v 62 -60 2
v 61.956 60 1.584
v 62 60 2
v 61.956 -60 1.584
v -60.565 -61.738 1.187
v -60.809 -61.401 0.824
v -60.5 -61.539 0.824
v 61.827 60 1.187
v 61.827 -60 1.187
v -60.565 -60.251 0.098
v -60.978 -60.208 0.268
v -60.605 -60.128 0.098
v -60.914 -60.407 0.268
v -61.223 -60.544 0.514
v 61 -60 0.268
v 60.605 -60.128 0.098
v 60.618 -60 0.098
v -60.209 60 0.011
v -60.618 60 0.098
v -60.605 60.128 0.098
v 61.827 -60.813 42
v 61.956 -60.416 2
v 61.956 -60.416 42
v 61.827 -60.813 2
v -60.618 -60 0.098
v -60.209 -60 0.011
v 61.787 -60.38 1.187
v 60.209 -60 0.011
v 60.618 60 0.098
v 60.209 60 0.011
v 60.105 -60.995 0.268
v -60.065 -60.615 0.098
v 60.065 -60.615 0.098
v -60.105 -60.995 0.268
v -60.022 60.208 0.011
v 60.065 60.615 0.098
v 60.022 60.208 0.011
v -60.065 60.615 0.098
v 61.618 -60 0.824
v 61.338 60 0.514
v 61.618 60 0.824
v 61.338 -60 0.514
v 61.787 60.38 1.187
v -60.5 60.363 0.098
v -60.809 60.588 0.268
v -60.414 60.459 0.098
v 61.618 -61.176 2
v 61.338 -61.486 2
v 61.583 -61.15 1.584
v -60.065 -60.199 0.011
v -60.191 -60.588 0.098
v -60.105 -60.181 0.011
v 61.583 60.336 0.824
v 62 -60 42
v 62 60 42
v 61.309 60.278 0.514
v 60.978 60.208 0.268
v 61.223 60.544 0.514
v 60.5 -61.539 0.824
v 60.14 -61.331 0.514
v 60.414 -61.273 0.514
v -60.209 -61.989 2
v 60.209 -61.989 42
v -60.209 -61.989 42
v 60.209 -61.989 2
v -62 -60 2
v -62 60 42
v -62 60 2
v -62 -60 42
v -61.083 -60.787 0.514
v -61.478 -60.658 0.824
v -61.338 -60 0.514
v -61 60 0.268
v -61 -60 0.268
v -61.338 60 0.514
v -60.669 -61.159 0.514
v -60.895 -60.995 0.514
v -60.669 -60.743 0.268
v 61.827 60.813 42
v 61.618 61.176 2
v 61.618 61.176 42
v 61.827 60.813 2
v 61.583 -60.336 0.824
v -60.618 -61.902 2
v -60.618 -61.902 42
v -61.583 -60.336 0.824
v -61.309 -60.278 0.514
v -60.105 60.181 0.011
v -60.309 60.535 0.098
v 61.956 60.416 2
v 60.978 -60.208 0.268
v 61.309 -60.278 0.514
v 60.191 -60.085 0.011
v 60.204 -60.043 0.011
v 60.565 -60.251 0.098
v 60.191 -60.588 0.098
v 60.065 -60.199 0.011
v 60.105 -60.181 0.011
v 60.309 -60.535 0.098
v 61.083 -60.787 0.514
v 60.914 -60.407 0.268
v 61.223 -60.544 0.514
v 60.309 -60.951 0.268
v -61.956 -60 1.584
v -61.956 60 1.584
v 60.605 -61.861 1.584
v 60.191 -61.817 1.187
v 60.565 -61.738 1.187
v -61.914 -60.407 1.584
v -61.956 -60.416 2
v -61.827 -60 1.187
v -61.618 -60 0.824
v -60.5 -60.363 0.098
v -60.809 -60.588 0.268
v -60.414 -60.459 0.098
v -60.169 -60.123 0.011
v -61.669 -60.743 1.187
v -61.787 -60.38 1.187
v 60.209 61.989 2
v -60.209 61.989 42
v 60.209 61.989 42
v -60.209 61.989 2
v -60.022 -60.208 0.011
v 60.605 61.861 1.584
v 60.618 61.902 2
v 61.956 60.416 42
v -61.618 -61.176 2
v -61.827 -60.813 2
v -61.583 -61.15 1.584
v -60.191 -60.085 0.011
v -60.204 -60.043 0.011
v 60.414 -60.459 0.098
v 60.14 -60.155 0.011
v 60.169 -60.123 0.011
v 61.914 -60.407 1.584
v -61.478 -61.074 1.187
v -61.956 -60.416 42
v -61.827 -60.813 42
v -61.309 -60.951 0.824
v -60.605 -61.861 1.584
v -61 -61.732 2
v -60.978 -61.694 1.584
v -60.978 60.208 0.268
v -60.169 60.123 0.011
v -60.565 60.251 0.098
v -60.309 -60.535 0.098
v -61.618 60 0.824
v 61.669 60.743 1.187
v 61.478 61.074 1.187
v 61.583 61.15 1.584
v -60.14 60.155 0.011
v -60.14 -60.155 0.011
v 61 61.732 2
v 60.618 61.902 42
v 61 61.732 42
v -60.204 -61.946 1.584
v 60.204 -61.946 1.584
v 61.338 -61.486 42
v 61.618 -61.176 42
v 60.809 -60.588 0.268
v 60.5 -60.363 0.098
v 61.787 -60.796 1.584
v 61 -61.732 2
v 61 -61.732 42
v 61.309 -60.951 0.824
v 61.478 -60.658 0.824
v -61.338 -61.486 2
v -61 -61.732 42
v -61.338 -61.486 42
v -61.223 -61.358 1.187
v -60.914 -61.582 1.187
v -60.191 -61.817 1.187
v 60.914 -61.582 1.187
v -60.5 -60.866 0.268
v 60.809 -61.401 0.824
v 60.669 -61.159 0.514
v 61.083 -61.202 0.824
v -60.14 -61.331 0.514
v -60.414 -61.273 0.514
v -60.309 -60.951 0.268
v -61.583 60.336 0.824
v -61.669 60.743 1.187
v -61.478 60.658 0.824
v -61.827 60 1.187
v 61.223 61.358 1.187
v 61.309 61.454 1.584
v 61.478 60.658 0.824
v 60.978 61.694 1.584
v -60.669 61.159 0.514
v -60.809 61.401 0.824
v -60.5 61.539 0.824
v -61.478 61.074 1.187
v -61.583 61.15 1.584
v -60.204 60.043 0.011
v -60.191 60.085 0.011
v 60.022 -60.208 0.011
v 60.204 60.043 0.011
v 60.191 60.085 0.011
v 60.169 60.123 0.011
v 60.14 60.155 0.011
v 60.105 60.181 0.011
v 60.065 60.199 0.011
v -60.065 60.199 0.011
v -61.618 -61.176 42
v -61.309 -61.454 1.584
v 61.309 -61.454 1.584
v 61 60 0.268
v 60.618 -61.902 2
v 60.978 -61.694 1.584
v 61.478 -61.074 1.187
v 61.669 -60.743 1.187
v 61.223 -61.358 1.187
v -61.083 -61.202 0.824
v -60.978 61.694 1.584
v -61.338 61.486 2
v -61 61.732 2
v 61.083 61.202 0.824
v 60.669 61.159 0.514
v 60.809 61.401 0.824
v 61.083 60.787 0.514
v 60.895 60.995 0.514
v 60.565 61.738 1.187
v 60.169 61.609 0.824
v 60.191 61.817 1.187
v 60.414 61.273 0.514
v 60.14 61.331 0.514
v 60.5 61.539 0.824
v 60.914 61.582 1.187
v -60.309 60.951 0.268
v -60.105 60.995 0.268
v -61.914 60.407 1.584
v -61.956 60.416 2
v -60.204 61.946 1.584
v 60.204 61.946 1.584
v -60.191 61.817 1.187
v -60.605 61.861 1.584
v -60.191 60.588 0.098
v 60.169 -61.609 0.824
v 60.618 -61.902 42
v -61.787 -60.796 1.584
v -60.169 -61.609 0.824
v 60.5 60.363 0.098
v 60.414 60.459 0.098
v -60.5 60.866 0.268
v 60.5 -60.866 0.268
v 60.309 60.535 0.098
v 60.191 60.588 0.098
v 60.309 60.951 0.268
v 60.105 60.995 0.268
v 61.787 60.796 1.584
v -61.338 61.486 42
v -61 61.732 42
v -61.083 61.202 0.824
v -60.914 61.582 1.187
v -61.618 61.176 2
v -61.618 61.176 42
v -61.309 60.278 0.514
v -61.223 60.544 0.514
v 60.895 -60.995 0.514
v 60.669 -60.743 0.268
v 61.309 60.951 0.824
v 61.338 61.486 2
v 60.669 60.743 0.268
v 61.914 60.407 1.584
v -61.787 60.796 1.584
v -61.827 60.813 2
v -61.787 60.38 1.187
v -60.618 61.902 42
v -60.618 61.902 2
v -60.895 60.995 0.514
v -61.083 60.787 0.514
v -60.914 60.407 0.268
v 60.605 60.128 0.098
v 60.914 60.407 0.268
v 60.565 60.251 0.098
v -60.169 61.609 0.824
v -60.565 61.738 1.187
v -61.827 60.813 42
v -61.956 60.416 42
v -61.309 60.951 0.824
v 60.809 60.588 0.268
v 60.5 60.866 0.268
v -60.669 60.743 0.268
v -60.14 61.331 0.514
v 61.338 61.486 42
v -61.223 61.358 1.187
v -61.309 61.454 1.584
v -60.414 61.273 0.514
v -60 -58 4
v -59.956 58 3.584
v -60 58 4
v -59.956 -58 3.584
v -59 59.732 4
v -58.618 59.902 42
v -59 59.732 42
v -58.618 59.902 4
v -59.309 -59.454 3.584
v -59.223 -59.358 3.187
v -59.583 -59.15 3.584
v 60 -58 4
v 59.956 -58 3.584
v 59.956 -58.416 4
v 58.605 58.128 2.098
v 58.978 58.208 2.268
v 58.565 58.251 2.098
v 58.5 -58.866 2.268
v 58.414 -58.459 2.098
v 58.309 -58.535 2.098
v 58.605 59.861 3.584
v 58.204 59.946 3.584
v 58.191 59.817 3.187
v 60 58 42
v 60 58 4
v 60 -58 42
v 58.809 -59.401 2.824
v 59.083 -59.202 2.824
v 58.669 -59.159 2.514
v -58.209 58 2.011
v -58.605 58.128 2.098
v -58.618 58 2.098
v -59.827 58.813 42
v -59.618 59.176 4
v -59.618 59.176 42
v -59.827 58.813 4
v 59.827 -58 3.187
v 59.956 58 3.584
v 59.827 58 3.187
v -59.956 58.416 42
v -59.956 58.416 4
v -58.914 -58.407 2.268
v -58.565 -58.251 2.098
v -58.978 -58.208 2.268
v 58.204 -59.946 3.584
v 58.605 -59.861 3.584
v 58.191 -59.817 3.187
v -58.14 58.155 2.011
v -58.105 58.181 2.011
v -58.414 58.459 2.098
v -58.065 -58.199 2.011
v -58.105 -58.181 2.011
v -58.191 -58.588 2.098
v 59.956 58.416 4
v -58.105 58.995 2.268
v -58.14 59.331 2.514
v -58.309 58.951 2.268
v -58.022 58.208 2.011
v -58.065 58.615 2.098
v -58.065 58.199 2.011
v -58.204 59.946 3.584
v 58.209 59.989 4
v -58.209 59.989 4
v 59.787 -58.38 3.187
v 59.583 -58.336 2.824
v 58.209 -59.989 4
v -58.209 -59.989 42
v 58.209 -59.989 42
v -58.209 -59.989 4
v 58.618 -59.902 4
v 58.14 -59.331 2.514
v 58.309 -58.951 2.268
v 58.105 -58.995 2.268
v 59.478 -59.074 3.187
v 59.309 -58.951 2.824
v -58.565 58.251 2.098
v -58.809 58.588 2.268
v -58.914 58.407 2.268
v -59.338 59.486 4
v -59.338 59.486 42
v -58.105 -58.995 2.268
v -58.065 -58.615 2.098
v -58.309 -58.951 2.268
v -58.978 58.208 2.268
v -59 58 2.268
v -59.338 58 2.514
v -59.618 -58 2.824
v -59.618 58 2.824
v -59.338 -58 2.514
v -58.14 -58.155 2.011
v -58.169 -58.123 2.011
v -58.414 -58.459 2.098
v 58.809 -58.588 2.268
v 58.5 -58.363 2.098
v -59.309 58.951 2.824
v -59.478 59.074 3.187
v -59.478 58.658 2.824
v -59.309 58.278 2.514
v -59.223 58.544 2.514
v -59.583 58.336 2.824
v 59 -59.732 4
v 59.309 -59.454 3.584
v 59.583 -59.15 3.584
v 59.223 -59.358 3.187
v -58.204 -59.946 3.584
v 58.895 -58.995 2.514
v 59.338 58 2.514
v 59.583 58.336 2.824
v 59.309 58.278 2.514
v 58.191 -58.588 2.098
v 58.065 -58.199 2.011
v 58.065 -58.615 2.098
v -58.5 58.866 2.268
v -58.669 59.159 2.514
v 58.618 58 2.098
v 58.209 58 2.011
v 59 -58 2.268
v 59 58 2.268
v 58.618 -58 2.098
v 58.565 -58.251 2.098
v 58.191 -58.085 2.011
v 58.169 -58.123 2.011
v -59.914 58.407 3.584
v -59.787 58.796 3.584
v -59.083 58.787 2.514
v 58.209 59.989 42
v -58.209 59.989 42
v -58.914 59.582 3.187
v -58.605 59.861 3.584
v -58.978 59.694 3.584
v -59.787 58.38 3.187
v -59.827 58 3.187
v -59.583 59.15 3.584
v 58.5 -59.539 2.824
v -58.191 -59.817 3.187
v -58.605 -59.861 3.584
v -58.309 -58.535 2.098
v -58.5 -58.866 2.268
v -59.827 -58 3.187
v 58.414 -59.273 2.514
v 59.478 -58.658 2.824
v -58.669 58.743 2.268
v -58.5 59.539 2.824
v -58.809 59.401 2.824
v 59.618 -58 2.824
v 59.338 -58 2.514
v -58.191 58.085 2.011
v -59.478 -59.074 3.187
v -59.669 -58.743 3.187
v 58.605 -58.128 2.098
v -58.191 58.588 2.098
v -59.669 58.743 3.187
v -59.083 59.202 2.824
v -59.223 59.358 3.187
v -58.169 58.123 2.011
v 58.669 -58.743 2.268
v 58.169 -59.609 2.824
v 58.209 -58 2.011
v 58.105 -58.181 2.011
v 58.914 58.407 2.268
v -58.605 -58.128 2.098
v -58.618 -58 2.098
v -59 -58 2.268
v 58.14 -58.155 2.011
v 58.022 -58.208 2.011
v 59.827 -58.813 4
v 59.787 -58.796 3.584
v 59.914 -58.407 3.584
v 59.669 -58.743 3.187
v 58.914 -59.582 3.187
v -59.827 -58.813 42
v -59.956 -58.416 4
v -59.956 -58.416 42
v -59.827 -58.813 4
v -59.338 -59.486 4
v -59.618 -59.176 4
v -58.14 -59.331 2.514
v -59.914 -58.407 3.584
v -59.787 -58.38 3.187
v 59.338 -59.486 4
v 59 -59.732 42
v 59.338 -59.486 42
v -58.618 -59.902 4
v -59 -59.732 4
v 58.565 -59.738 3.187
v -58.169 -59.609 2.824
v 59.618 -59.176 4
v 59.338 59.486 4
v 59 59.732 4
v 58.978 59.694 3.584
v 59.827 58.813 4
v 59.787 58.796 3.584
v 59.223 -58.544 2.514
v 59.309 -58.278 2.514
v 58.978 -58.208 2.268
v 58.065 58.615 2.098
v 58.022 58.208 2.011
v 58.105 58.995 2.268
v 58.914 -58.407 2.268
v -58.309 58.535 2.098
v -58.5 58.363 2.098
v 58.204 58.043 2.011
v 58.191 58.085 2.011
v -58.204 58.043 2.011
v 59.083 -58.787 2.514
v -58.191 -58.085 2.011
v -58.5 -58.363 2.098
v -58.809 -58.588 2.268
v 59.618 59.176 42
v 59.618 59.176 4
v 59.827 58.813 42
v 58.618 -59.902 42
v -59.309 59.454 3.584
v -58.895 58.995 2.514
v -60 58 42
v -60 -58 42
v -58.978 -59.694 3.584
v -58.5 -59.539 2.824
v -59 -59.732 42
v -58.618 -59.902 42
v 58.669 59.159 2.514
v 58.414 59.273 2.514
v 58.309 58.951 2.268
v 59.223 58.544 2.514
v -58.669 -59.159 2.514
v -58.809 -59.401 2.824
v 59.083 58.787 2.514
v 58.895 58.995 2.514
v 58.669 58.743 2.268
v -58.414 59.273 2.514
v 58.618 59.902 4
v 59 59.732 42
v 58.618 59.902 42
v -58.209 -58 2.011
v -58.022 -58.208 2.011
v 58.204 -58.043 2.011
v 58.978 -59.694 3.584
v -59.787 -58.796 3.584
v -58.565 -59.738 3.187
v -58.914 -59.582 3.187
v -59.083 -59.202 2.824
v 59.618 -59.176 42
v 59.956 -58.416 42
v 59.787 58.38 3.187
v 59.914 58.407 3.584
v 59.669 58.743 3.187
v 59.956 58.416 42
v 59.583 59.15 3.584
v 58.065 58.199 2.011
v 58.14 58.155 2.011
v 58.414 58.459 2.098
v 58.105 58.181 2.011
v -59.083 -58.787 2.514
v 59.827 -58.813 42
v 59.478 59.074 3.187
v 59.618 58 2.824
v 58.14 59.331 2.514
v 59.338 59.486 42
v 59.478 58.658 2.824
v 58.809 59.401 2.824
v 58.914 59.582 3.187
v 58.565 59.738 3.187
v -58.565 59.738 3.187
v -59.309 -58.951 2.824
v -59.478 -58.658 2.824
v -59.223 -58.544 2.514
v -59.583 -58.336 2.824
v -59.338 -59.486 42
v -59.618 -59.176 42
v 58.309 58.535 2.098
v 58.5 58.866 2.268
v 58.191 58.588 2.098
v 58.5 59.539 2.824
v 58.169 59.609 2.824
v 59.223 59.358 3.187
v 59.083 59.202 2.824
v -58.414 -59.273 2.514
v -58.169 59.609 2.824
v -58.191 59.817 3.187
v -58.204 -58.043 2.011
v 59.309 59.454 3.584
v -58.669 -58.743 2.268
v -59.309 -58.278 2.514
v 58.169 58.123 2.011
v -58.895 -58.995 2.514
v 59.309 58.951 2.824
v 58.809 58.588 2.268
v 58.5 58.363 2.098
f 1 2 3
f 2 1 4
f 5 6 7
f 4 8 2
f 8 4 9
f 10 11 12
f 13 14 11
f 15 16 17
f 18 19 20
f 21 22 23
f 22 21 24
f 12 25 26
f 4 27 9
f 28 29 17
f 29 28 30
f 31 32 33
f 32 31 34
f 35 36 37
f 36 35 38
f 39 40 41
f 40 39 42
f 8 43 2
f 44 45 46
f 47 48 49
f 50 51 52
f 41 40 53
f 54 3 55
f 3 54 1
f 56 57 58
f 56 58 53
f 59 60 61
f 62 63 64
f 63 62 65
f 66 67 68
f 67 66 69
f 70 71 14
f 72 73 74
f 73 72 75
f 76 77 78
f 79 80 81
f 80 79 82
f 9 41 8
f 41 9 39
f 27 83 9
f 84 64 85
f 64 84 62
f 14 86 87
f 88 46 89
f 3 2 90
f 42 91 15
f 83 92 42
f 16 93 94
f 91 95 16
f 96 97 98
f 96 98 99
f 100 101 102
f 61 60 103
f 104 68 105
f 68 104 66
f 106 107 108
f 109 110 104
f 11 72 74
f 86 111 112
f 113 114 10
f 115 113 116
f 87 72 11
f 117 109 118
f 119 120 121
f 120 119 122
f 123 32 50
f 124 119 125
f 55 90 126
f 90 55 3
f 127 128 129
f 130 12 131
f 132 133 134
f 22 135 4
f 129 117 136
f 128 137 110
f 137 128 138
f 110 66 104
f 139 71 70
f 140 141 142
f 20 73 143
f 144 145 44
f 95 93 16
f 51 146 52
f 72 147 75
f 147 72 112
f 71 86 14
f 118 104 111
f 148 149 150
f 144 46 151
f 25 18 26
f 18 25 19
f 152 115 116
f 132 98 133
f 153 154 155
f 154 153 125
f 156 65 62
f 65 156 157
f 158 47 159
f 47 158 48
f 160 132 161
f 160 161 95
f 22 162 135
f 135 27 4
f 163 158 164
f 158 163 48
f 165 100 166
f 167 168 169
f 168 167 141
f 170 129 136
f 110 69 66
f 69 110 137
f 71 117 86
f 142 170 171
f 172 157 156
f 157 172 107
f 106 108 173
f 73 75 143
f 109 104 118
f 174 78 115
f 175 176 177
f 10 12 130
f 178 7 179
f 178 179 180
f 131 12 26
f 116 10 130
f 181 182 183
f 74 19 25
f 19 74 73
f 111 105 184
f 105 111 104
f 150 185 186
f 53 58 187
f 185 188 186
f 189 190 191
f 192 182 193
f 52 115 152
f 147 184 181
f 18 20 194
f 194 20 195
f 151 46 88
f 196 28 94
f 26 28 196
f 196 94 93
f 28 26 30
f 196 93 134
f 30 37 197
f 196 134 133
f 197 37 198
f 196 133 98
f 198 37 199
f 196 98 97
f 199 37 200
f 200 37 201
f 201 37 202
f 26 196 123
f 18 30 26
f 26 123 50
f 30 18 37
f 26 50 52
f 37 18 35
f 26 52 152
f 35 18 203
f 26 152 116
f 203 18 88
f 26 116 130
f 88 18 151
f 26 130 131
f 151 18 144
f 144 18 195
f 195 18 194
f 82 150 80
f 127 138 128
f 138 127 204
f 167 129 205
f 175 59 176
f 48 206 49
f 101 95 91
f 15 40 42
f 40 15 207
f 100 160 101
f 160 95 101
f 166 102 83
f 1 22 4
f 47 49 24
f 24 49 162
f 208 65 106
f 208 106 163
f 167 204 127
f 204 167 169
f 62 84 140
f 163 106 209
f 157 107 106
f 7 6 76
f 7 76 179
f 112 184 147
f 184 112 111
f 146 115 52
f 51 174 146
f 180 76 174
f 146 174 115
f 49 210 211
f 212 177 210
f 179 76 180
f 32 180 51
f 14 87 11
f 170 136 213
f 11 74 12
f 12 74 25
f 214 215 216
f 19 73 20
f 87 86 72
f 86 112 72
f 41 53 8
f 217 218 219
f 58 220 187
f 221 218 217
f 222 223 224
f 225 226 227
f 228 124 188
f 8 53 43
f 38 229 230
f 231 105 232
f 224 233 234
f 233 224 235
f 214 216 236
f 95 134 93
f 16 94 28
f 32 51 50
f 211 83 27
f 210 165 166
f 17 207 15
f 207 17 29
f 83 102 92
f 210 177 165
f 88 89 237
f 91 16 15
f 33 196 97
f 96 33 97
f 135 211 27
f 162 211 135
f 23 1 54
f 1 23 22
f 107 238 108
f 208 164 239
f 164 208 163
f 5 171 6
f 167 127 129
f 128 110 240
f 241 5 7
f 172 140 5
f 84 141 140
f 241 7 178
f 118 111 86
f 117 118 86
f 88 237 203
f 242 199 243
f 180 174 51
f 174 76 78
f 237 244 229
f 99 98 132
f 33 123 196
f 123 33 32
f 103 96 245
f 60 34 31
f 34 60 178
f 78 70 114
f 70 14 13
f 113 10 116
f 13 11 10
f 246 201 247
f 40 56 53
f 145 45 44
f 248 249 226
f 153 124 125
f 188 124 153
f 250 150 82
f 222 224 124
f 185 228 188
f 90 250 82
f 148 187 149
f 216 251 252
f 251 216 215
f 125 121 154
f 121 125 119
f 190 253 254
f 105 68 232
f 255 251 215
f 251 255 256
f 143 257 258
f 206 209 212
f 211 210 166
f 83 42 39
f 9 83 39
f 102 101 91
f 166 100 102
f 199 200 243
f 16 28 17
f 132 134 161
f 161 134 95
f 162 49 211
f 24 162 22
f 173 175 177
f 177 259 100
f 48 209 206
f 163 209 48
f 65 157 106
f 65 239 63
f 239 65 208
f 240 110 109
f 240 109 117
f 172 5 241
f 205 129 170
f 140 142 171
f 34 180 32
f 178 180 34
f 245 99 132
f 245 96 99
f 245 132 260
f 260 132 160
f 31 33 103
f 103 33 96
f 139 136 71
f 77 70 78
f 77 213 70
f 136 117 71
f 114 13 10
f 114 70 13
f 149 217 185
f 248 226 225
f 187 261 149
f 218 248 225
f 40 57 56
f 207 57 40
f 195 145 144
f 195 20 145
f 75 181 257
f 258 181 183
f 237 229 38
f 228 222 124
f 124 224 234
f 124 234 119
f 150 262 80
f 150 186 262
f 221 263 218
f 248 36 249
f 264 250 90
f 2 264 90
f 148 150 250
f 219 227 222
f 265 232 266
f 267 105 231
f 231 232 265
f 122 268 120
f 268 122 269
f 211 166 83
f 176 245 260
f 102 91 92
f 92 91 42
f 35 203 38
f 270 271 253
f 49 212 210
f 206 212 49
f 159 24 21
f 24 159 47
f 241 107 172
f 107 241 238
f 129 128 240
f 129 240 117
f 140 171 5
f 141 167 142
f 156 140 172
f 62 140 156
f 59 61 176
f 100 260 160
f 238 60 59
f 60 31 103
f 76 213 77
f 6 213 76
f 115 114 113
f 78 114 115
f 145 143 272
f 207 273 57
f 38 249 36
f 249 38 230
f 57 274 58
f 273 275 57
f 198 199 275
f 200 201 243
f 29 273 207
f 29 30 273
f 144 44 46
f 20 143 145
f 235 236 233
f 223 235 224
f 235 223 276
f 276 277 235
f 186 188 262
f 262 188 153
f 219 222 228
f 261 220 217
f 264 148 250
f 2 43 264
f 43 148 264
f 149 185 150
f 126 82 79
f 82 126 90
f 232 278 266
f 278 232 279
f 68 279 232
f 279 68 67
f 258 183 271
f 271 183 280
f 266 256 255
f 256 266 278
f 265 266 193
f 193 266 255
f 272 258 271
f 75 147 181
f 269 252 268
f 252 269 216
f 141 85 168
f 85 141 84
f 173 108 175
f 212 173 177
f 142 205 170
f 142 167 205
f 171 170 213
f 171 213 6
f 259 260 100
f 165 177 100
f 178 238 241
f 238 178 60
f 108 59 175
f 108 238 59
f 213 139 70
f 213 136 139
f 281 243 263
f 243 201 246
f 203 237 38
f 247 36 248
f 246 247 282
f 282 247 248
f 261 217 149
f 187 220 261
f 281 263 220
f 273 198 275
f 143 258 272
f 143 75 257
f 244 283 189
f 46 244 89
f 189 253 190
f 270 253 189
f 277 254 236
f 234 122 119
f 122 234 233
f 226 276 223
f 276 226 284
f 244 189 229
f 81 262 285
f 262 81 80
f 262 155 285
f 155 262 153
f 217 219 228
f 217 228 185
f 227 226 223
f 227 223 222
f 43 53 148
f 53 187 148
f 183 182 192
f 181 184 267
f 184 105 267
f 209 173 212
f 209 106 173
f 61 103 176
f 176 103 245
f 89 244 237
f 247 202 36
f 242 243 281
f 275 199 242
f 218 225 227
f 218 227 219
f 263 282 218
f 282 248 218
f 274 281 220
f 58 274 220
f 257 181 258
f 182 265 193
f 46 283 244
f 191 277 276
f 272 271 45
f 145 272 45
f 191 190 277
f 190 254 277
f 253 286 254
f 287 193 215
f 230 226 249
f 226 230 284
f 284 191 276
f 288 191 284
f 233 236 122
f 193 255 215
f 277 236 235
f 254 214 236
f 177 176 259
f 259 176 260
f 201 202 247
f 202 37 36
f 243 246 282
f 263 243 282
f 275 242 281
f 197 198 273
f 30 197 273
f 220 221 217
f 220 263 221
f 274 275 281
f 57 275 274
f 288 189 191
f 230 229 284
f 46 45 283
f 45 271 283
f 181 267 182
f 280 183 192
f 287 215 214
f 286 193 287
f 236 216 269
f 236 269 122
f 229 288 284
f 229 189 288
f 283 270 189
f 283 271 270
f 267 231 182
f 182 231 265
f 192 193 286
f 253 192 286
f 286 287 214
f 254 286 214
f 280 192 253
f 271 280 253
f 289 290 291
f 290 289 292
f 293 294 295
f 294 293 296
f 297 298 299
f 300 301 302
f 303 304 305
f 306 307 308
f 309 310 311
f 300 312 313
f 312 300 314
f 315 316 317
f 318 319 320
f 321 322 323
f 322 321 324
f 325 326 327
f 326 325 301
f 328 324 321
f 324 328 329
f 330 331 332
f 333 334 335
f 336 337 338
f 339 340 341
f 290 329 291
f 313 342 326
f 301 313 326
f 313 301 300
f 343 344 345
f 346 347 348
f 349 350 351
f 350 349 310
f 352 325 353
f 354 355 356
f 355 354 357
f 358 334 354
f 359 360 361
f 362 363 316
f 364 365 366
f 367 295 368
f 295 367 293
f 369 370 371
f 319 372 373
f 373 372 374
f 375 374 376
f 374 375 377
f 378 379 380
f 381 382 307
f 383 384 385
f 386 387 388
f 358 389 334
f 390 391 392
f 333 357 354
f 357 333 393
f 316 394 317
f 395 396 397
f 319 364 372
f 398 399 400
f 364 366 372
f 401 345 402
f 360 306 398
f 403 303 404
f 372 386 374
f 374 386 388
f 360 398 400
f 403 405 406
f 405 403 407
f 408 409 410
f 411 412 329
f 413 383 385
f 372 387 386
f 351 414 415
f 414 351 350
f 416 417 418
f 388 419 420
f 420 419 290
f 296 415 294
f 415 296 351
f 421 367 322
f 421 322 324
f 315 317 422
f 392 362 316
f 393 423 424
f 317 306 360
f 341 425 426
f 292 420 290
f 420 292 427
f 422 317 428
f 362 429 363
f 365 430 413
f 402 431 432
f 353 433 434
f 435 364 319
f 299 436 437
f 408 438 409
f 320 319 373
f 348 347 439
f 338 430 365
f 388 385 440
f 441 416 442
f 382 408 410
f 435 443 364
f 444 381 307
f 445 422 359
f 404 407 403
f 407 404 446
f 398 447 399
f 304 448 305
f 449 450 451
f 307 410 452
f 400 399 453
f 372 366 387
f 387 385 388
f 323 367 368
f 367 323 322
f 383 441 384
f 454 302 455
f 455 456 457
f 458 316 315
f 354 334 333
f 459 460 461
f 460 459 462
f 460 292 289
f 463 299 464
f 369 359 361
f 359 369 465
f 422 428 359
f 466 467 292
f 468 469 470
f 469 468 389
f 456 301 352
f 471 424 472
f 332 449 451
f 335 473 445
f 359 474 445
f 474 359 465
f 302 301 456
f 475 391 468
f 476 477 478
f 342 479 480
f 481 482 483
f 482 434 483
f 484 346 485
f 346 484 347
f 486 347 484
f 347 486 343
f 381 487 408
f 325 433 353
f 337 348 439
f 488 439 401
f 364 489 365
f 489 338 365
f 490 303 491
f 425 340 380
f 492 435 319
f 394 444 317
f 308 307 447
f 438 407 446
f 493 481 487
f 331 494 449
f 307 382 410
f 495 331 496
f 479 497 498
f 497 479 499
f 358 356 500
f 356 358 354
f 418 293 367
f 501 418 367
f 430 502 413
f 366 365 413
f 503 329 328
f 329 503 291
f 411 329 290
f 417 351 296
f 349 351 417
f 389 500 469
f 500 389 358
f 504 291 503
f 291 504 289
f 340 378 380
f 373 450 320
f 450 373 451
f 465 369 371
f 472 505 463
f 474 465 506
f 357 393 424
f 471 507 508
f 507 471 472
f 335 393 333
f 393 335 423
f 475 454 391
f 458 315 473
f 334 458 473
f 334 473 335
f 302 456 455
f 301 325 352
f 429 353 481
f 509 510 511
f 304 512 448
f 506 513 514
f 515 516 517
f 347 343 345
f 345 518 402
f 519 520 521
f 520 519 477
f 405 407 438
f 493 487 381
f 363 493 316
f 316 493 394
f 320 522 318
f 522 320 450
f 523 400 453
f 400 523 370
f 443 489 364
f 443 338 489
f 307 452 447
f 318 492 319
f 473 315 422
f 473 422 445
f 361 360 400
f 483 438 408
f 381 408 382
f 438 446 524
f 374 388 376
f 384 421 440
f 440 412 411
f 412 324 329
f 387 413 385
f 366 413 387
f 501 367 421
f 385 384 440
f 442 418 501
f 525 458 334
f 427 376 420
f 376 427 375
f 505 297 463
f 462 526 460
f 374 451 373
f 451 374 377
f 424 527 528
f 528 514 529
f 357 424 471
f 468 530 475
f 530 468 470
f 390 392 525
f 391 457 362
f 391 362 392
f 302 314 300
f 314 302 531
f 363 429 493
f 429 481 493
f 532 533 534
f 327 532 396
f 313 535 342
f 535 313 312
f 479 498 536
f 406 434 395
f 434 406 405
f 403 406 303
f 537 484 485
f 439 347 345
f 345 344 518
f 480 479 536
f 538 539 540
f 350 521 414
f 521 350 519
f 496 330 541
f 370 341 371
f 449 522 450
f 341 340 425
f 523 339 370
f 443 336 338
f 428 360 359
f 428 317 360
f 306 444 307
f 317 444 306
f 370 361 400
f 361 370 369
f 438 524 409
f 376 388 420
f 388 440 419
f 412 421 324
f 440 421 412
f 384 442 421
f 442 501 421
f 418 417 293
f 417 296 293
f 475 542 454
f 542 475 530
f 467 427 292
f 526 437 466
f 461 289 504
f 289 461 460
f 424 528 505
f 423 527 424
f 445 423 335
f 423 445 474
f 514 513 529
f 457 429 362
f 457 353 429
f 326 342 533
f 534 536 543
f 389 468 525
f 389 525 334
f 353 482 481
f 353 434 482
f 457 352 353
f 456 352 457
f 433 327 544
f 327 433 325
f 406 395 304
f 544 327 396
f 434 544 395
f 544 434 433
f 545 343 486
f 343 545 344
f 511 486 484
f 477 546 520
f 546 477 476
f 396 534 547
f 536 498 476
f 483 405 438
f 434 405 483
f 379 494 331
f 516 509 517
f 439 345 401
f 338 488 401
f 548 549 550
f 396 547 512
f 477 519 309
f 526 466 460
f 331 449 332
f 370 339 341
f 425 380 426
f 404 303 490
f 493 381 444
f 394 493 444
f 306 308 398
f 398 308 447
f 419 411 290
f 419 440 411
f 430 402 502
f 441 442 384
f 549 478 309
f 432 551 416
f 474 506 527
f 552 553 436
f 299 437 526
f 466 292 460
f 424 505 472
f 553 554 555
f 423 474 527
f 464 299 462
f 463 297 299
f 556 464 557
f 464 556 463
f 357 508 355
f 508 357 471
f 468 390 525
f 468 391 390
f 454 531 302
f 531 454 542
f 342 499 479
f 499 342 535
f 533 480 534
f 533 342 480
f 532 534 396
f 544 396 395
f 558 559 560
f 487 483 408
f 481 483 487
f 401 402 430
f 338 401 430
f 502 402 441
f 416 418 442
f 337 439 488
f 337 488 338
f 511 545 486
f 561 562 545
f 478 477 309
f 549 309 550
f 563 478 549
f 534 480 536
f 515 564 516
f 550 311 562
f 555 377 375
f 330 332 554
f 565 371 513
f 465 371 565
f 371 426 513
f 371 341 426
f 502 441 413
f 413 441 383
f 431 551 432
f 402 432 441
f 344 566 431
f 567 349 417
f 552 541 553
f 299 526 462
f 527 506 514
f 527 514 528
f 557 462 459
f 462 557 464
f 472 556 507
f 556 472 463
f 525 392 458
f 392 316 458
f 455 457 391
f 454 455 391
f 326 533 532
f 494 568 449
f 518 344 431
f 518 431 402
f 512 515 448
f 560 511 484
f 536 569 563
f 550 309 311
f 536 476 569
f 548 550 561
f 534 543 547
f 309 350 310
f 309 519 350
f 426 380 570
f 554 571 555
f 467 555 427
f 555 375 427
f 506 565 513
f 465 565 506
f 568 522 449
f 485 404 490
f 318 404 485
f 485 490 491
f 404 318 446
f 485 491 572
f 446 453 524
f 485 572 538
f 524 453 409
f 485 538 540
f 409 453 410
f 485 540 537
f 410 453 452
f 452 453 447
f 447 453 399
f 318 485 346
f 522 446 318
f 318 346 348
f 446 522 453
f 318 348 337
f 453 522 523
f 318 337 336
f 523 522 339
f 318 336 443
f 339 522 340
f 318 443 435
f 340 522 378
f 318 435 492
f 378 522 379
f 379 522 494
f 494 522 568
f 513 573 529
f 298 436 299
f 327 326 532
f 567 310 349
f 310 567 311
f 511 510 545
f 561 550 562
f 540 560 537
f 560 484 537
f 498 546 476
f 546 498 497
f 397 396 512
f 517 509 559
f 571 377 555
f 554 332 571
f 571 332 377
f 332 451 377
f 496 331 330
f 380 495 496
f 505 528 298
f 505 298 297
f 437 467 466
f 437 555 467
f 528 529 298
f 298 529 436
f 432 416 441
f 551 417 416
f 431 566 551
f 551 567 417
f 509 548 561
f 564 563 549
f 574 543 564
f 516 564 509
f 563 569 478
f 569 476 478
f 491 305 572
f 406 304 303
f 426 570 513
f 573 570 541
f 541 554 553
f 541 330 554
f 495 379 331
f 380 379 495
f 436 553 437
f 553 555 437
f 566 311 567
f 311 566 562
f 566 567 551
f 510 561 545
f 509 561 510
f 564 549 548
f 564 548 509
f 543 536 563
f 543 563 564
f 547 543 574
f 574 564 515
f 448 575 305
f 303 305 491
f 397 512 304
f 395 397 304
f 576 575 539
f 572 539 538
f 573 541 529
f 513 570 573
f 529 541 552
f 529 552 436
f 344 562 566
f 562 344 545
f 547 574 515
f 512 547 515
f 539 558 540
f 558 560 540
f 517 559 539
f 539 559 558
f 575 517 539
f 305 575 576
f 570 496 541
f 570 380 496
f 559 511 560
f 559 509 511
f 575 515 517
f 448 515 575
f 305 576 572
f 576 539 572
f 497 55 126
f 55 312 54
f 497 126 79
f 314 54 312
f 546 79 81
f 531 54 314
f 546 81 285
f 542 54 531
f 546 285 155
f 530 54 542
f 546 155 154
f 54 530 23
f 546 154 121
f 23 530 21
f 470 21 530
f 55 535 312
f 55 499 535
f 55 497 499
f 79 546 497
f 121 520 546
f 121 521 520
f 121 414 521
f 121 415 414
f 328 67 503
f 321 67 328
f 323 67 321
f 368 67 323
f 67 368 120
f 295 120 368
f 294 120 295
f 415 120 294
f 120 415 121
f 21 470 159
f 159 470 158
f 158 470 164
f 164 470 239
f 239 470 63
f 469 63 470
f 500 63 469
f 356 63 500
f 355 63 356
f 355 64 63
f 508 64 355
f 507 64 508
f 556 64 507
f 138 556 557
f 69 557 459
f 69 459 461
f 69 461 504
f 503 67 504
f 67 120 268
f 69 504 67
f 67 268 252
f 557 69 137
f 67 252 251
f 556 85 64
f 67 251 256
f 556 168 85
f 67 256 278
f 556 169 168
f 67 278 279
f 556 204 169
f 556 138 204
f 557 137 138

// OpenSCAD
curve = 2;
box_side = 120;
wall_t = 2;
box_h = 40;
translate([-box_side / 2, -box_side / 2, curve])
difference() {
minkowski() {
cube(size = [box_side, box_side, box_h + curve]);
    sphere(r=curve, $fn=30);
}
translate([wall_t, wall_t, wall_t])
minkowski() {
cube(size = [box_side - wall_t * 2, box_side - wall_t * 2, box_h + curve]);
    sphere(r=curve, $fn=30);
}
#translate([-curve * 2, -curve * 2, box_h])
cube(size=[box_side * 2, box_side * 2, box_h * 2]);
}
